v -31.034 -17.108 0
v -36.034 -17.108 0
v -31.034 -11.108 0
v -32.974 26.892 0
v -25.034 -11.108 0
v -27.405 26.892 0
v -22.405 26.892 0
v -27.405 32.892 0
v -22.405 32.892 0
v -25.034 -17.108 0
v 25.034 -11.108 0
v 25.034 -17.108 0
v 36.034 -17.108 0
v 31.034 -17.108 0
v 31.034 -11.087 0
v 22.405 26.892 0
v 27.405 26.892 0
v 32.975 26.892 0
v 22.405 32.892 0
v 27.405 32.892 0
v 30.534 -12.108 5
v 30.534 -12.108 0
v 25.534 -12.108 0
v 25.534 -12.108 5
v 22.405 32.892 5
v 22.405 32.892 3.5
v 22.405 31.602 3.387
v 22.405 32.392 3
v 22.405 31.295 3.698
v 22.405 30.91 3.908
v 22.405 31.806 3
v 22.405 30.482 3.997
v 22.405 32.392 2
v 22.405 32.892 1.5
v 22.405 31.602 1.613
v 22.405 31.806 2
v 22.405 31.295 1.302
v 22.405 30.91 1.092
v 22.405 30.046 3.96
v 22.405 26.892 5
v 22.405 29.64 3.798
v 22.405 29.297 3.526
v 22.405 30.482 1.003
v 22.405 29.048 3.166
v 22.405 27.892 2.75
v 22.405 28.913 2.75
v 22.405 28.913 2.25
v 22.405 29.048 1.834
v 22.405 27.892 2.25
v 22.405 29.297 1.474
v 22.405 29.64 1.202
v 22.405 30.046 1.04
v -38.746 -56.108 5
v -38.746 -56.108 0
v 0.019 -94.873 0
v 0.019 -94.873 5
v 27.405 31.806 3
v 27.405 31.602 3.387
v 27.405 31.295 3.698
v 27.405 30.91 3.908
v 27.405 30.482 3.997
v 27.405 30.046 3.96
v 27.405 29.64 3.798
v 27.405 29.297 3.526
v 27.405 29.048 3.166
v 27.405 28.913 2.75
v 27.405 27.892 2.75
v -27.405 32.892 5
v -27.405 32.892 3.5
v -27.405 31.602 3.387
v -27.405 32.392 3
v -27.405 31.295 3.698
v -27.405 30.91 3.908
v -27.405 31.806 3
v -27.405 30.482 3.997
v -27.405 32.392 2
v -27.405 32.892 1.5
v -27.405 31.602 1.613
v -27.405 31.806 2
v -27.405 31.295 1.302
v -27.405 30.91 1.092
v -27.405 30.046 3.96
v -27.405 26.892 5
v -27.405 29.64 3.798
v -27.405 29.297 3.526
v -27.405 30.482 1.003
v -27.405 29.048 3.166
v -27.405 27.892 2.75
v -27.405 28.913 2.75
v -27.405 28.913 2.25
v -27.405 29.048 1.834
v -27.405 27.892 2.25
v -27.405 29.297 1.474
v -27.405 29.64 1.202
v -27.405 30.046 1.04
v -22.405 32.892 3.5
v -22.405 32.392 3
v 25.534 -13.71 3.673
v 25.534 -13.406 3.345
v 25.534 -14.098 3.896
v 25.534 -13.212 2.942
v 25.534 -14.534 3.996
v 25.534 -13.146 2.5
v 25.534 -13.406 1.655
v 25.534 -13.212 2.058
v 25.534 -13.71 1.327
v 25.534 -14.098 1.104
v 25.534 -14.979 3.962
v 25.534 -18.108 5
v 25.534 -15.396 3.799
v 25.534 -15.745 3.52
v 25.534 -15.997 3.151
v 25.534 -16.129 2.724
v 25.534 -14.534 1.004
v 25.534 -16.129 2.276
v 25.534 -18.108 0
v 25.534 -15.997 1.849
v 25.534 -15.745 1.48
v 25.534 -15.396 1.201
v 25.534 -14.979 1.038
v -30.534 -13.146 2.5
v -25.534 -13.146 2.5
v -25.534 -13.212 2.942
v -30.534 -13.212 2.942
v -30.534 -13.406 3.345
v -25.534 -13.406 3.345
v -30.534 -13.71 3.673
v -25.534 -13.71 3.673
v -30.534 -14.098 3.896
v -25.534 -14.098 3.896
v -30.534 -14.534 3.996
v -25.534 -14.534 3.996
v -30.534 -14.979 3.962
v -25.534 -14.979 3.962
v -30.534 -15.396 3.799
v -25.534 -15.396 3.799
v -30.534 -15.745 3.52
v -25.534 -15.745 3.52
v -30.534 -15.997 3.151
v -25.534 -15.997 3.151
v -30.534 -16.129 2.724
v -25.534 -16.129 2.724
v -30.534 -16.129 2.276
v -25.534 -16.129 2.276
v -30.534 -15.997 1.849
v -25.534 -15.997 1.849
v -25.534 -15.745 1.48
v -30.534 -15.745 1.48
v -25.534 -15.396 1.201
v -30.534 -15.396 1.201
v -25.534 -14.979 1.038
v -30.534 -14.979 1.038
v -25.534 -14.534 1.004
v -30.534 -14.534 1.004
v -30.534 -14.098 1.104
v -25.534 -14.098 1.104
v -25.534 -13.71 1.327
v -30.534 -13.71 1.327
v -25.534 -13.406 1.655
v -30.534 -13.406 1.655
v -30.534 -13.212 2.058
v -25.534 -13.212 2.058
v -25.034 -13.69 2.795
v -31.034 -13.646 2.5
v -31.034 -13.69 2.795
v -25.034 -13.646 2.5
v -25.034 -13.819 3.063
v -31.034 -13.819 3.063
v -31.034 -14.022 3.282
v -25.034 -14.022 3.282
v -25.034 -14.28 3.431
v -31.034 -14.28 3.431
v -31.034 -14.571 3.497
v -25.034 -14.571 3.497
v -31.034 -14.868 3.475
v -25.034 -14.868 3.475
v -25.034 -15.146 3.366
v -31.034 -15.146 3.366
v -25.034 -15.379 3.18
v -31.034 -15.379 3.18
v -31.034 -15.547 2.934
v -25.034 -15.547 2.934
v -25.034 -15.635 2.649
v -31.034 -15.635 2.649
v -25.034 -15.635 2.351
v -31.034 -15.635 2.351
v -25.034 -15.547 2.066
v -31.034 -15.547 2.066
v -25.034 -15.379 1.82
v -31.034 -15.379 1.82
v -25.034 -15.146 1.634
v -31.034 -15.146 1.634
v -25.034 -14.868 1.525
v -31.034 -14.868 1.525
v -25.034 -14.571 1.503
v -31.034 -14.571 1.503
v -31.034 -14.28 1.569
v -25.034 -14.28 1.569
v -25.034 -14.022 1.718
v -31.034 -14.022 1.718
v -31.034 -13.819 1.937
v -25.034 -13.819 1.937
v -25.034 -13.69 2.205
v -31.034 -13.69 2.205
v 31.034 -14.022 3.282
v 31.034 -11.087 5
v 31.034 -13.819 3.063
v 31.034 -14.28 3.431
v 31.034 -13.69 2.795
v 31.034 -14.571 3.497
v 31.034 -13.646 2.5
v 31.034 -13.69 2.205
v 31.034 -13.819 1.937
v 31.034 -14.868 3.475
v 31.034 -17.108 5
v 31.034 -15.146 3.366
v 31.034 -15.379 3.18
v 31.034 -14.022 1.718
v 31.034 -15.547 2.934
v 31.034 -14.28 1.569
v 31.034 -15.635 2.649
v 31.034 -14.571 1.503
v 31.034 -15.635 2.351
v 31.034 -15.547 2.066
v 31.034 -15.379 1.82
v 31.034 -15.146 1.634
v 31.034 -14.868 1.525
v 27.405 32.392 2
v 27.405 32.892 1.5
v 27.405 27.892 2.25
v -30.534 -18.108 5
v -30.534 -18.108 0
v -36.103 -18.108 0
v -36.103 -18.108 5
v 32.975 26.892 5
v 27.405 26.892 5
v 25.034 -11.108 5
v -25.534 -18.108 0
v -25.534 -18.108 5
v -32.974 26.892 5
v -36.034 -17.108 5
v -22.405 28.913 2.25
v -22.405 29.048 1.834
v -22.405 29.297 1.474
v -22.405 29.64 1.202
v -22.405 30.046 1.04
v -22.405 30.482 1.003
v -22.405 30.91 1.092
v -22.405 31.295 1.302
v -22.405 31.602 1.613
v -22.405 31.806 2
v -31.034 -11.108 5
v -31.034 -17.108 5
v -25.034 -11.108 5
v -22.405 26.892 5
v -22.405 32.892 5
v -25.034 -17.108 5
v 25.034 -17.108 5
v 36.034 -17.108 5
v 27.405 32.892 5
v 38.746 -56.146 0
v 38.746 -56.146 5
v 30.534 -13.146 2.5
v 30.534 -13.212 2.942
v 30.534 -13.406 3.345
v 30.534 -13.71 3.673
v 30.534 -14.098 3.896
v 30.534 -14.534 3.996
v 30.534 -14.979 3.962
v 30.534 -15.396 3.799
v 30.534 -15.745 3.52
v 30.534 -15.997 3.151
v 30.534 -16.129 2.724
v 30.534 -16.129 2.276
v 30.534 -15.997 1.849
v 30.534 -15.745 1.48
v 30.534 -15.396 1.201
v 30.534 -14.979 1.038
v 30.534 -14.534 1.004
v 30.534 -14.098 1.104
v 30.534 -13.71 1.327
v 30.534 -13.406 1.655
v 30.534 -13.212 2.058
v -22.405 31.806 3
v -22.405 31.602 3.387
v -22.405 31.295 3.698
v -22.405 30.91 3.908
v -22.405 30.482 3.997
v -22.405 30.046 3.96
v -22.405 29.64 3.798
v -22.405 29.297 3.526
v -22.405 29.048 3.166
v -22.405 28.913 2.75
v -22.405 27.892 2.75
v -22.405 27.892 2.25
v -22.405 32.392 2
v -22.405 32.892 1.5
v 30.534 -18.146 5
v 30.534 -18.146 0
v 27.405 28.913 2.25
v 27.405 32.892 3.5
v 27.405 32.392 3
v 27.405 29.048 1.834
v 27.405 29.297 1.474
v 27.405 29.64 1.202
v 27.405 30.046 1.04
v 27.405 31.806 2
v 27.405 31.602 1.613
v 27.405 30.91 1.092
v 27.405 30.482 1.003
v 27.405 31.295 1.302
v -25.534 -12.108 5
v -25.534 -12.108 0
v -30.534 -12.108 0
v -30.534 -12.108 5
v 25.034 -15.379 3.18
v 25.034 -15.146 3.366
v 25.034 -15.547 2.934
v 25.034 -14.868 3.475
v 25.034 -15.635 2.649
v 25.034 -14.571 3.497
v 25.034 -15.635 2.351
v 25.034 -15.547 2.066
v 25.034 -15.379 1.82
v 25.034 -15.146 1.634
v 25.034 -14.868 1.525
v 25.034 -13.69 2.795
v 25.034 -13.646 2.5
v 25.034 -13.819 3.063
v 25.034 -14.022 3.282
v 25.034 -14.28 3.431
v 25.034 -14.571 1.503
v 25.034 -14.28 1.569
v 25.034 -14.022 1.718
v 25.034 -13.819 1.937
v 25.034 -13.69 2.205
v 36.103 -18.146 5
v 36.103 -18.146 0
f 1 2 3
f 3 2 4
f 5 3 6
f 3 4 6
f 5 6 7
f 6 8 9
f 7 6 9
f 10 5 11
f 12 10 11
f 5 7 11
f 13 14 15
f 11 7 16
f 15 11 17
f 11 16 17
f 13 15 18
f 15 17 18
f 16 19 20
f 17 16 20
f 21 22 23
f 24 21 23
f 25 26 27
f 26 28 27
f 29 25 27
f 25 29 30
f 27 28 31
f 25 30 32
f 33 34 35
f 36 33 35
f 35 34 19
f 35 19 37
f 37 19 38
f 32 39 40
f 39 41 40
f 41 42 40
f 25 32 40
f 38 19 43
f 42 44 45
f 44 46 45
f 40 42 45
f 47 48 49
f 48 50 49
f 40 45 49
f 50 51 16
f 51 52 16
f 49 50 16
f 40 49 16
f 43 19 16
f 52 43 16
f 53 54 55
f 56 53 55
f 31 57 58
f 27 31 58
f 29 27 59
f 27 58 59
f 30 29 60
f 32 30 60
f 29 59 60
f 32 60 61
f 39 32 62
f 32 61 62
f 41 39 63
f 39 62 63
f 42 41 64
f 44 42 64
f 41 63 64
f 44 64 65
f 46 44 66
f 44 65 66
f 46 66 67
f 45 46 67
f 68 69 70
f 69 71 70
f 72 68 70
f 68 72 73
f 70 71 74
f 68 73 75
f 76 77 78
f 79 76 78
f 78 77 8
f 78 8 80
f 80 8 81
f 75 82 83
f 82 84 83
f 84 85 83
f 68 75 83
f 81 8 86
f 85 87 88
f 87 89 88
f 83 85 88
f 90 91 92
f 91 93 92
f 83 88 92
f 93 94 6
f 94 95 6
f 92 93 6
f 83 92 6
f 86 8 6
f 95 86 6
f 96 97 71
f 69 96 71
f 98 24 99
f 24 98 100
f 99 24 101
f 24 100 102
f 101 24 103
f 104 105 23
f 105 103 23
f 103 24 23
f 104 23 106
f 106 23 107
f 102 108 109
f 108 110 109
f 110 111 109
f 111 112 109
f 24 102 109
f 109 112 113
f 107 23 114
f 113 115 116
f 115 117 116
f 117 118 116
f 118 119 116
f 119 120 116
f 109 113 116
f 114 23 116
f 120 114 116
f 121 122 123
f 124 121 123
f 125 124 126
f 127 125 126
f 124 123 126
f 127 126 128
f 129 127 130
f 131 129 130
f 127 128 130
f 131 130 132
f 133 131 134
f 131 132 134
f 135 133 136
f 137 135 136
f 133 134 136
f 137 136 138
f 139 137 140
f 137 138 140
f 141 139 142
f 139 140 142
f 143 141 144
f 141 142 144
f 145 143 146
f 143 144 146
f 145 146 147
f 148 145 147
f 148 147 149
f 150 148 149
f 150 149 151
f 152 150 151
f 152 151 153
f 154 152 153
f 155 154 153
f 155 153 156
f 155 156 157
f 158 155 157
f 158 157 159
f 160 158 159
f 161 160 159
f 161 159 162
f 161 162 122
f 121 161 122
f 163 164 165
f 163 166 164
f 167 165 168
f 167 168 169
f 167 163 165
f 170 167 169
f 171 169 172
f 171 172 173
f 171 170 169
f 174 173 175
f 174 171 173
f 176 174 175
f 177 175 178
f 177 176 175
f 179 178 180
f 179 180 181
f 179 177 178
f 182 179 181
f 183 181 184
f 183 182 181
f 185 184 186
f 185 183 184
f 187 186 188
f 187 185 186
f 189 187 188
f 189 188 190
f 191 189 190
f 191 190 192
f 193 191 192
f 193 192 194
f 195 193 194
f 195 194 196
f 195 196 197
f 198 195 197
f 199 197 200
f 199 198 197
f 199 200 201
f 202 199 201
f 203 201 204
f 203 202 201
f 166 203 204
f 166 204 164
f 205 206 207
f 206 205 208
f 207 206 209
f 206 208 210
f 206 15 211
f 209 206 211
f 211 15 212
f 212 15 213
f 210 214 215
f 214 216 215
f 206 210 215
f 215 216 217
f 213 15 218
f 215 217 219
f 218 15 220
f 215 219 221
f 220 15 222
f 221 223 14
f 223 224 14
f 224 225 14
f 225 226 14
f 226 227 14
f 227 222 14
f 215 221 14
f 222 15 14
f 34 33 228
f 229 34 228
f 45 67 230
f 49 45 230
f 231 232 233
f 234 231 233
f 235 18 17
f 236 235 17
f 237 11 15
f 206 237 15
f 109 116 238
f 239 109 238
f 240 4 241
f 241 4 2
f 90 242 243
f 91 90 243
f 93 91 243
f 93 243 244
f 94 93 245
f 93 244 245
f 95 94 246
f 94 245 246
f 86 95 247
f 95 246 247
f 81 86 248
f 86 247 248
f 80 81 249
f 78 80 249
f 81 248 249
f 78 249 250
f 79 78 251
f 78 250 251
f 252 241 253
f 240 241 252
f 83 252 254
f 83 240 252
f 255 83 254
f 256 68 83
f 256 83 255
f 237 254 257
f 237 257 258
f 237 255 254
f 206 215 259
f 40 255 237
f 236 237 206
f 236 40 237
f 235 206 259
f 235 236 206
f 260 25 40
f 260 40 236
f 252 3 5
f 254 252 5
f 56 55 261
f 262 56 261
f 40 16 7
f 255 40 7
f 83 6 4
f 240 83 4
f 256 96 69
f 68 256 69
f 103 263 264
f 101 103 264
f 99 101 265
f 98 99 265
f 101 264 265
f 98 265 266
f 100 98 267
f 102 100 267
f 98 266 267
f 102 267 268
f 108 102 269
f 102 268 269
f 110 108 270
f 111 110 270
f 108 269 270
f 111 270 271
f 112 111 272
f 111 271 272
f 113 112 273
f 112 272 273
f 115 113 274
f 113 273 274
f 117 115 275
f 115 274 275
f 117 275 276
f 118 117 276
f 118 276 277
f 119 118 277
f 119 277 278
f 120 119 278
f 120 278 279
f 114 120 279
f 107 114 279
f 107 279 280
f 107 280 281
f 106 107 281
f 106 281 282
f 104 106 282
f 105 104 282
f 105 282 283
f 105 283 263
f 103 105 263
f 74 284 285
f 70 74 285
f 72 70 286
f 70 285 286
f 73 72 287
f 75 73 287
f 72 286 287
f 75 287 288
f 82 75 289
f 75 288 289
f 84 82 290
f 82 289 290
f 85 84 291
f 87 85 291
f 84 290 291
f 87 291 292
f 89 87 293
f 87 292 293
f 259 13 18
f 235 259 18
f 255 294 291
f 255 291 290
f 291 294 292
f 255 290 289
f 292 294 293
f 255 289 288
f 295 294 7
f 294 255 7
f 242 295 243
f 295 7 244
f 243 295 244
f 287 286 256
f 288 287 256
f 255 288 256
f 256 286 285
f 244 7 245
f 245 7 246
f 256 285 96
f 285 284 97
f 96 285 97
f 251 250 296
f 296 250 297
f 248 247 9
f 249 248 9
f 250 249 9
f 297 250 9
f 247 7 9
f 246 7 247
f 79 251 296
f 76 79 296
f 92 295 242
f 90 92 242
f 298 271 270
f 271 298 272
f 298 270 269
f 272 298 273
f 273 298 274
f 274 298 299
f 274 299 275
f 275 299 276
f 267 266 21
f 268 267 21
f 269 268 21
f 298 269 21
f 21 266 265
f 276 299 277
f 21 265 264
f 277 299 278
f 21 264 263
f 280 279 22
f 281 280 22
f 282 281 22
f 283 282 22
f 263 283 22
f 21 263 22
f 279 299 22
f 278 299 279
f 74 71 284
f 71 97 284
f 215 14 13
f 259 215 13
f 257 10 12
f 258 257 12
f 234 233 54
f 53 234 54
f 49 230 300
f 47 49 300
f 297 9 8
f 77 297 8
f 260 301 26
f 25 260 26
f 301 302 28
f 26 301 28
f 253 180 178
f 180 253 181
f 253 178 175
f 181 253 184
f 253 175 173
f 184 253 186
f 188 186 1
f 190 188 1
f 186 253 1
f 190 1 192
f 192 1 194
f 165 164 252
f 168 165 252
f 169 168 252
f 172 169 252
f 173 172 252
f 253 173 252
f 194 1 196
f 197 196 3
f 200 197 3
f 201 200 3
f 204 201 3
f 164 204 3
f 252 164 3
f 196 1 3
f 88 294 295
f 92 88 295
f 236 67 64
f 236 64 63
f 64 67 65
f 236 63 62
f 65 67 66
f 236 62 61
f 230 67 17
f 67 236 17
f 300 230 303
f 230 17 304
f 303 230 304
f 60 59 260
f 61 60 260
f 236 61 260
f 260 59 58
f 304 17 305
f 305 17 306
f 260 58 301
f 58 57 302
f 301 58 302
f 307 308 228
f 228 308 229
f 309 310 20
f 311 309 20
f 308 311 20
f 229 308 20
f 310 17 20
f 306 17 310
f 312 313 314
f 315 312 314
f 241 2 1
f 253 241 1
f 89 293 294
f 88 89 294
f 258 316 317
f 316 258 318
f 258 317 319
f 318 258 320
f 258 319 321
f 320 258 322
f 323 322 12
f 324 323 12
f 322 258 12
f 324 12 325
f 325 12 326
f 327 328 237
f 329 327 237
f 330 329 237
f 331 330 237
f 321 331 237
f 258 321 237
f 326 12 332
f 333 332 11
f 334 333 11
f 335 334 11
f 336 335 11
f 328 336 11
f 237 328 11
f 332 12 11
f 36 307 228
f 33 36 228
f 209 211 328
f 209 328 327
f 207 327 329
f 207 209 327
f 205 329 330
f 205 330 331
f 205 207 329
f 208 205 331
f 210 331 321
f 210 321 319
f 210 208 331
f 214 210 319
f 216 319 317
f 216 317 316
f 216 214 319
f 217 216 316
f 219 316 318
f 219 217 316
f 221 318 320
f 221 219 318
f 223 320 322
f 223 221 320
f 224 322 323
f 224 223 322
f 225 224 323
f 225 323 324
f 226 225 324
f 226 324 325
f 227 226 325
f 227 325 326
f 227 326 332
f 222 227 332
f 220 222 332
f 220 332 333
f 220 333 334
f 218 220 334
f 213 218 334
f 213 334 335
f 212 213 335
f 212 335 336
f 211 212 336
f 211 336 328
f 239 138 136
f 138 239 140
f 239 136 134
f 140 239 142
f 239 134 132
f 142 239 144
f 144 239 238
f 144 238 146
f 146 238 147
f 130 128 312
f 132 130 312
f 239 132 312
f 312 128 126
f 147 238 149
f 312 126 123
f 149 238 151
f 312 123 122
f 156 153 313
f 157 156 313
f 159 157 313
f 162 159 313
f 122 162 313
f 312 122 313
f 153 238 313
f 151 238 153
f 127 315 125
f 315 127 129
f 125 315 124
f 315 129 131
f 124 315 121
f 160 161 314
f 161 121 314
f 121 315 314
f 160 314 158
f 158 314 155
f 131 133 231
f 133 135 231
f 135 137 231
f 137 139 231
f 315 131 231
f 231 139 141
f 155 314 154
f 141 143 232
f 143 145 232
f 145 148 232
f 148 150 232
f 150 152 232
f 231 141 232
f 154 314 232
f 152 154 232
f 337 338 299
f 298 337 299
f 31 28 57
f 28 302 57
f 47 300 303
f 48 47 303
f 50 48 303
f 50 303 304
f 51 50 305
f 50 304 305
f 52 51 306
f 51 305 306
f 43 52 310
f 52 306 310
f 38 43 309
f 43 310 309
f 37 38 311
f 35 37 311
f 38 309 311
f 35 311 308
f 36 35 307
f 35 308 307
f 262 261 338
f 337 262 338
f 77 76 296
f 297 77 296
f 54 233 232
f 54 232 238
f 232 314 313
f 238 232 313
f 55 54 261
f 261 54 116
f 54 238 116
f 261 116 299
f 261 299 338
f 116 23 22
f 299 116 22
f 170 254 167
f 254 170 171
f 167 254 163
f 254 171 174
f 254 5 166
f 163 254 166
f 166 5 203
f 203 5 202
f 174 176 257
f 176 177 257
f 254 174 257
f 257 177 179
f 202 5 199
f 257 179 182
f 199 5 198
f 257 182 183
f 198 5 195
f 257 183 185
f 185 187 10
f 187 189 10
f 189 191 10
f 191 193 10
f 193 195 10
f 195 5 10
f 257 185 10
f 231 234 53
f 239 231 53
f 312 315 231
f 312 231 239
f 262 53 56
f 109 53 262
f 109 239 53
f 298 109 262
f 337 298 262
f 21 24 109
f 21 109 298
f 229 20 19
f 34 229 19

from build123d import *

# Parameters (mm, degrees)
F1_DEPTH = 5
F4_DEPTH = 72.8
F5_SIZE  = 0.5
F8_START = -7
F7_R     = 1.5
F7_R_2   = 1
F8_DEPTH = 68.5
F9_START = -5.6
F9_DEPTH = 68.7


with BuildPart() as f1:
    # F0 (on Top) → F1 (new body)
    with BuildSketch(Plane.XY):
        Polygon((-36.1032915569, -18.1079245215), (-38.7457432998, -56.1079245215), (0.0188927832, -94.8725606045), (38.7457432998, -56.145710088), (36.10329, -18.1457101963), (30.53375, -18.1457101963), (30.53375, -12.1079245215), (25.53375, -12.1079245215), (25.53375, -17.1079245215), (25.53375, -18.1079245215), (-25.5337533532, -18.1079245215), (-25.5337533532, -12.1079245215), (-30.5337533532, -12.1079245215), (-30.5337533532, -18.1079245215), align=None)
    extrude(amount=F1_DEPTH)

    # F7 (on offset) → F8 (cut)
    with BuildSketch(Plane.YZ.offset(40.53375).offset(F8_START)):
        with Locations((-14.6457101963, 2.5)):
            Circle(F7_R)
        with Locations((-14.6457101963, 2.5)):
            Circle(F7_R_2, mode=Mode.SUBTRACT)
    extrude(amount=-F8_DEPTH, mode=Mode.SUBTRACT)



with BuildPart() as f1b:
    # F0 (on Top) → F1, piece 2 (new body)
    with BuildSketch(Plane.XY):
        Polygon((-36.0337533532, -17.1079245215), (-31.0337533532, -17.1079245215), (-31.0337533532, -11.1079245215), (-25.0337533532, -11.1079245215), (-25.0337533532, -17.1079245215), (25.03375, -17.1079245215), (25.03375, -11.1079245215), (31.03375, -11.0867864177), (31.03375, -17.1079245215), (36.03375, -17.1079245215), (32.974534184, 26.8920754785), (27.404534184, 26.8920754785), (27.404534184, 32.8920754785), (22.404534184, 32.8920754785), (22.404534184, 26.8920754785), (-22.404534184, 26.8920754785), (-22.404534184, 32.8920754785), (-27.404534184, 32.8920754785), (-27.404534184, 26.8920754785), (-32.9740723878, 26.8920754785), align=None)
    extrude(amount=F1_DEPTH)

    # F3 (on offset) → F4 (cut)
    with BuildSketch(Plane.YZ.offset(37.404534184)):
        with BuildLine():
            Line((34.7708482201, 3), (31.8062890408, 3))
            ThreePointArc((31.8062890408, 3), (30.2629438912, 3.9944313411), (28.9130555327, 2.75))
            Line((28.9130555327, 2.75), (27.8920754785, 2.75))
            Line((27.8920754785, 2.75), (27.8920754785, 2.25))
            Line((27.8920754785, 2.25), (28.9130555327, 2.25))
            ThreePointArc((28.9130555327, 2.25), (30.2629438912, 1.0055686589), (31.8062890408, 2))
            Line((31.8062890408, 2), (34.7708482201, 2))
            Line((34.7708482201, 2), (34.7708482201, 3))
        make_face()
    extrude(amount=-F4_DEPTH, mode=Mode.SUBTRACT)

    # F5
    f5_edges = [f1b.edges().sort_by_distance(p)[0] for p in [
        (24.904534, 32.892075, 3),
        (24.904534, 32.892075, 2),
        (-24.904534, 32.892075, 3),
        (-24.904534, 32.892075, 2),
    ]]
    chamfer(f5_edges, length=F5_SIZE)


with BuildPart() as f1_1:
    add(f1.part)

    add(f1b.part)  # F9 merges F1b
    # F7 (on offset) → F9 (join)
    with BuildSketch(Plane.YZ.offset(40.53375).offset(F9_START)):
        with Locations((-14.6457101963, 2.5)):
            Circle(F7_R_2)
    extrude(amount=-F9_DEPTH)


solid = f1_1.part
